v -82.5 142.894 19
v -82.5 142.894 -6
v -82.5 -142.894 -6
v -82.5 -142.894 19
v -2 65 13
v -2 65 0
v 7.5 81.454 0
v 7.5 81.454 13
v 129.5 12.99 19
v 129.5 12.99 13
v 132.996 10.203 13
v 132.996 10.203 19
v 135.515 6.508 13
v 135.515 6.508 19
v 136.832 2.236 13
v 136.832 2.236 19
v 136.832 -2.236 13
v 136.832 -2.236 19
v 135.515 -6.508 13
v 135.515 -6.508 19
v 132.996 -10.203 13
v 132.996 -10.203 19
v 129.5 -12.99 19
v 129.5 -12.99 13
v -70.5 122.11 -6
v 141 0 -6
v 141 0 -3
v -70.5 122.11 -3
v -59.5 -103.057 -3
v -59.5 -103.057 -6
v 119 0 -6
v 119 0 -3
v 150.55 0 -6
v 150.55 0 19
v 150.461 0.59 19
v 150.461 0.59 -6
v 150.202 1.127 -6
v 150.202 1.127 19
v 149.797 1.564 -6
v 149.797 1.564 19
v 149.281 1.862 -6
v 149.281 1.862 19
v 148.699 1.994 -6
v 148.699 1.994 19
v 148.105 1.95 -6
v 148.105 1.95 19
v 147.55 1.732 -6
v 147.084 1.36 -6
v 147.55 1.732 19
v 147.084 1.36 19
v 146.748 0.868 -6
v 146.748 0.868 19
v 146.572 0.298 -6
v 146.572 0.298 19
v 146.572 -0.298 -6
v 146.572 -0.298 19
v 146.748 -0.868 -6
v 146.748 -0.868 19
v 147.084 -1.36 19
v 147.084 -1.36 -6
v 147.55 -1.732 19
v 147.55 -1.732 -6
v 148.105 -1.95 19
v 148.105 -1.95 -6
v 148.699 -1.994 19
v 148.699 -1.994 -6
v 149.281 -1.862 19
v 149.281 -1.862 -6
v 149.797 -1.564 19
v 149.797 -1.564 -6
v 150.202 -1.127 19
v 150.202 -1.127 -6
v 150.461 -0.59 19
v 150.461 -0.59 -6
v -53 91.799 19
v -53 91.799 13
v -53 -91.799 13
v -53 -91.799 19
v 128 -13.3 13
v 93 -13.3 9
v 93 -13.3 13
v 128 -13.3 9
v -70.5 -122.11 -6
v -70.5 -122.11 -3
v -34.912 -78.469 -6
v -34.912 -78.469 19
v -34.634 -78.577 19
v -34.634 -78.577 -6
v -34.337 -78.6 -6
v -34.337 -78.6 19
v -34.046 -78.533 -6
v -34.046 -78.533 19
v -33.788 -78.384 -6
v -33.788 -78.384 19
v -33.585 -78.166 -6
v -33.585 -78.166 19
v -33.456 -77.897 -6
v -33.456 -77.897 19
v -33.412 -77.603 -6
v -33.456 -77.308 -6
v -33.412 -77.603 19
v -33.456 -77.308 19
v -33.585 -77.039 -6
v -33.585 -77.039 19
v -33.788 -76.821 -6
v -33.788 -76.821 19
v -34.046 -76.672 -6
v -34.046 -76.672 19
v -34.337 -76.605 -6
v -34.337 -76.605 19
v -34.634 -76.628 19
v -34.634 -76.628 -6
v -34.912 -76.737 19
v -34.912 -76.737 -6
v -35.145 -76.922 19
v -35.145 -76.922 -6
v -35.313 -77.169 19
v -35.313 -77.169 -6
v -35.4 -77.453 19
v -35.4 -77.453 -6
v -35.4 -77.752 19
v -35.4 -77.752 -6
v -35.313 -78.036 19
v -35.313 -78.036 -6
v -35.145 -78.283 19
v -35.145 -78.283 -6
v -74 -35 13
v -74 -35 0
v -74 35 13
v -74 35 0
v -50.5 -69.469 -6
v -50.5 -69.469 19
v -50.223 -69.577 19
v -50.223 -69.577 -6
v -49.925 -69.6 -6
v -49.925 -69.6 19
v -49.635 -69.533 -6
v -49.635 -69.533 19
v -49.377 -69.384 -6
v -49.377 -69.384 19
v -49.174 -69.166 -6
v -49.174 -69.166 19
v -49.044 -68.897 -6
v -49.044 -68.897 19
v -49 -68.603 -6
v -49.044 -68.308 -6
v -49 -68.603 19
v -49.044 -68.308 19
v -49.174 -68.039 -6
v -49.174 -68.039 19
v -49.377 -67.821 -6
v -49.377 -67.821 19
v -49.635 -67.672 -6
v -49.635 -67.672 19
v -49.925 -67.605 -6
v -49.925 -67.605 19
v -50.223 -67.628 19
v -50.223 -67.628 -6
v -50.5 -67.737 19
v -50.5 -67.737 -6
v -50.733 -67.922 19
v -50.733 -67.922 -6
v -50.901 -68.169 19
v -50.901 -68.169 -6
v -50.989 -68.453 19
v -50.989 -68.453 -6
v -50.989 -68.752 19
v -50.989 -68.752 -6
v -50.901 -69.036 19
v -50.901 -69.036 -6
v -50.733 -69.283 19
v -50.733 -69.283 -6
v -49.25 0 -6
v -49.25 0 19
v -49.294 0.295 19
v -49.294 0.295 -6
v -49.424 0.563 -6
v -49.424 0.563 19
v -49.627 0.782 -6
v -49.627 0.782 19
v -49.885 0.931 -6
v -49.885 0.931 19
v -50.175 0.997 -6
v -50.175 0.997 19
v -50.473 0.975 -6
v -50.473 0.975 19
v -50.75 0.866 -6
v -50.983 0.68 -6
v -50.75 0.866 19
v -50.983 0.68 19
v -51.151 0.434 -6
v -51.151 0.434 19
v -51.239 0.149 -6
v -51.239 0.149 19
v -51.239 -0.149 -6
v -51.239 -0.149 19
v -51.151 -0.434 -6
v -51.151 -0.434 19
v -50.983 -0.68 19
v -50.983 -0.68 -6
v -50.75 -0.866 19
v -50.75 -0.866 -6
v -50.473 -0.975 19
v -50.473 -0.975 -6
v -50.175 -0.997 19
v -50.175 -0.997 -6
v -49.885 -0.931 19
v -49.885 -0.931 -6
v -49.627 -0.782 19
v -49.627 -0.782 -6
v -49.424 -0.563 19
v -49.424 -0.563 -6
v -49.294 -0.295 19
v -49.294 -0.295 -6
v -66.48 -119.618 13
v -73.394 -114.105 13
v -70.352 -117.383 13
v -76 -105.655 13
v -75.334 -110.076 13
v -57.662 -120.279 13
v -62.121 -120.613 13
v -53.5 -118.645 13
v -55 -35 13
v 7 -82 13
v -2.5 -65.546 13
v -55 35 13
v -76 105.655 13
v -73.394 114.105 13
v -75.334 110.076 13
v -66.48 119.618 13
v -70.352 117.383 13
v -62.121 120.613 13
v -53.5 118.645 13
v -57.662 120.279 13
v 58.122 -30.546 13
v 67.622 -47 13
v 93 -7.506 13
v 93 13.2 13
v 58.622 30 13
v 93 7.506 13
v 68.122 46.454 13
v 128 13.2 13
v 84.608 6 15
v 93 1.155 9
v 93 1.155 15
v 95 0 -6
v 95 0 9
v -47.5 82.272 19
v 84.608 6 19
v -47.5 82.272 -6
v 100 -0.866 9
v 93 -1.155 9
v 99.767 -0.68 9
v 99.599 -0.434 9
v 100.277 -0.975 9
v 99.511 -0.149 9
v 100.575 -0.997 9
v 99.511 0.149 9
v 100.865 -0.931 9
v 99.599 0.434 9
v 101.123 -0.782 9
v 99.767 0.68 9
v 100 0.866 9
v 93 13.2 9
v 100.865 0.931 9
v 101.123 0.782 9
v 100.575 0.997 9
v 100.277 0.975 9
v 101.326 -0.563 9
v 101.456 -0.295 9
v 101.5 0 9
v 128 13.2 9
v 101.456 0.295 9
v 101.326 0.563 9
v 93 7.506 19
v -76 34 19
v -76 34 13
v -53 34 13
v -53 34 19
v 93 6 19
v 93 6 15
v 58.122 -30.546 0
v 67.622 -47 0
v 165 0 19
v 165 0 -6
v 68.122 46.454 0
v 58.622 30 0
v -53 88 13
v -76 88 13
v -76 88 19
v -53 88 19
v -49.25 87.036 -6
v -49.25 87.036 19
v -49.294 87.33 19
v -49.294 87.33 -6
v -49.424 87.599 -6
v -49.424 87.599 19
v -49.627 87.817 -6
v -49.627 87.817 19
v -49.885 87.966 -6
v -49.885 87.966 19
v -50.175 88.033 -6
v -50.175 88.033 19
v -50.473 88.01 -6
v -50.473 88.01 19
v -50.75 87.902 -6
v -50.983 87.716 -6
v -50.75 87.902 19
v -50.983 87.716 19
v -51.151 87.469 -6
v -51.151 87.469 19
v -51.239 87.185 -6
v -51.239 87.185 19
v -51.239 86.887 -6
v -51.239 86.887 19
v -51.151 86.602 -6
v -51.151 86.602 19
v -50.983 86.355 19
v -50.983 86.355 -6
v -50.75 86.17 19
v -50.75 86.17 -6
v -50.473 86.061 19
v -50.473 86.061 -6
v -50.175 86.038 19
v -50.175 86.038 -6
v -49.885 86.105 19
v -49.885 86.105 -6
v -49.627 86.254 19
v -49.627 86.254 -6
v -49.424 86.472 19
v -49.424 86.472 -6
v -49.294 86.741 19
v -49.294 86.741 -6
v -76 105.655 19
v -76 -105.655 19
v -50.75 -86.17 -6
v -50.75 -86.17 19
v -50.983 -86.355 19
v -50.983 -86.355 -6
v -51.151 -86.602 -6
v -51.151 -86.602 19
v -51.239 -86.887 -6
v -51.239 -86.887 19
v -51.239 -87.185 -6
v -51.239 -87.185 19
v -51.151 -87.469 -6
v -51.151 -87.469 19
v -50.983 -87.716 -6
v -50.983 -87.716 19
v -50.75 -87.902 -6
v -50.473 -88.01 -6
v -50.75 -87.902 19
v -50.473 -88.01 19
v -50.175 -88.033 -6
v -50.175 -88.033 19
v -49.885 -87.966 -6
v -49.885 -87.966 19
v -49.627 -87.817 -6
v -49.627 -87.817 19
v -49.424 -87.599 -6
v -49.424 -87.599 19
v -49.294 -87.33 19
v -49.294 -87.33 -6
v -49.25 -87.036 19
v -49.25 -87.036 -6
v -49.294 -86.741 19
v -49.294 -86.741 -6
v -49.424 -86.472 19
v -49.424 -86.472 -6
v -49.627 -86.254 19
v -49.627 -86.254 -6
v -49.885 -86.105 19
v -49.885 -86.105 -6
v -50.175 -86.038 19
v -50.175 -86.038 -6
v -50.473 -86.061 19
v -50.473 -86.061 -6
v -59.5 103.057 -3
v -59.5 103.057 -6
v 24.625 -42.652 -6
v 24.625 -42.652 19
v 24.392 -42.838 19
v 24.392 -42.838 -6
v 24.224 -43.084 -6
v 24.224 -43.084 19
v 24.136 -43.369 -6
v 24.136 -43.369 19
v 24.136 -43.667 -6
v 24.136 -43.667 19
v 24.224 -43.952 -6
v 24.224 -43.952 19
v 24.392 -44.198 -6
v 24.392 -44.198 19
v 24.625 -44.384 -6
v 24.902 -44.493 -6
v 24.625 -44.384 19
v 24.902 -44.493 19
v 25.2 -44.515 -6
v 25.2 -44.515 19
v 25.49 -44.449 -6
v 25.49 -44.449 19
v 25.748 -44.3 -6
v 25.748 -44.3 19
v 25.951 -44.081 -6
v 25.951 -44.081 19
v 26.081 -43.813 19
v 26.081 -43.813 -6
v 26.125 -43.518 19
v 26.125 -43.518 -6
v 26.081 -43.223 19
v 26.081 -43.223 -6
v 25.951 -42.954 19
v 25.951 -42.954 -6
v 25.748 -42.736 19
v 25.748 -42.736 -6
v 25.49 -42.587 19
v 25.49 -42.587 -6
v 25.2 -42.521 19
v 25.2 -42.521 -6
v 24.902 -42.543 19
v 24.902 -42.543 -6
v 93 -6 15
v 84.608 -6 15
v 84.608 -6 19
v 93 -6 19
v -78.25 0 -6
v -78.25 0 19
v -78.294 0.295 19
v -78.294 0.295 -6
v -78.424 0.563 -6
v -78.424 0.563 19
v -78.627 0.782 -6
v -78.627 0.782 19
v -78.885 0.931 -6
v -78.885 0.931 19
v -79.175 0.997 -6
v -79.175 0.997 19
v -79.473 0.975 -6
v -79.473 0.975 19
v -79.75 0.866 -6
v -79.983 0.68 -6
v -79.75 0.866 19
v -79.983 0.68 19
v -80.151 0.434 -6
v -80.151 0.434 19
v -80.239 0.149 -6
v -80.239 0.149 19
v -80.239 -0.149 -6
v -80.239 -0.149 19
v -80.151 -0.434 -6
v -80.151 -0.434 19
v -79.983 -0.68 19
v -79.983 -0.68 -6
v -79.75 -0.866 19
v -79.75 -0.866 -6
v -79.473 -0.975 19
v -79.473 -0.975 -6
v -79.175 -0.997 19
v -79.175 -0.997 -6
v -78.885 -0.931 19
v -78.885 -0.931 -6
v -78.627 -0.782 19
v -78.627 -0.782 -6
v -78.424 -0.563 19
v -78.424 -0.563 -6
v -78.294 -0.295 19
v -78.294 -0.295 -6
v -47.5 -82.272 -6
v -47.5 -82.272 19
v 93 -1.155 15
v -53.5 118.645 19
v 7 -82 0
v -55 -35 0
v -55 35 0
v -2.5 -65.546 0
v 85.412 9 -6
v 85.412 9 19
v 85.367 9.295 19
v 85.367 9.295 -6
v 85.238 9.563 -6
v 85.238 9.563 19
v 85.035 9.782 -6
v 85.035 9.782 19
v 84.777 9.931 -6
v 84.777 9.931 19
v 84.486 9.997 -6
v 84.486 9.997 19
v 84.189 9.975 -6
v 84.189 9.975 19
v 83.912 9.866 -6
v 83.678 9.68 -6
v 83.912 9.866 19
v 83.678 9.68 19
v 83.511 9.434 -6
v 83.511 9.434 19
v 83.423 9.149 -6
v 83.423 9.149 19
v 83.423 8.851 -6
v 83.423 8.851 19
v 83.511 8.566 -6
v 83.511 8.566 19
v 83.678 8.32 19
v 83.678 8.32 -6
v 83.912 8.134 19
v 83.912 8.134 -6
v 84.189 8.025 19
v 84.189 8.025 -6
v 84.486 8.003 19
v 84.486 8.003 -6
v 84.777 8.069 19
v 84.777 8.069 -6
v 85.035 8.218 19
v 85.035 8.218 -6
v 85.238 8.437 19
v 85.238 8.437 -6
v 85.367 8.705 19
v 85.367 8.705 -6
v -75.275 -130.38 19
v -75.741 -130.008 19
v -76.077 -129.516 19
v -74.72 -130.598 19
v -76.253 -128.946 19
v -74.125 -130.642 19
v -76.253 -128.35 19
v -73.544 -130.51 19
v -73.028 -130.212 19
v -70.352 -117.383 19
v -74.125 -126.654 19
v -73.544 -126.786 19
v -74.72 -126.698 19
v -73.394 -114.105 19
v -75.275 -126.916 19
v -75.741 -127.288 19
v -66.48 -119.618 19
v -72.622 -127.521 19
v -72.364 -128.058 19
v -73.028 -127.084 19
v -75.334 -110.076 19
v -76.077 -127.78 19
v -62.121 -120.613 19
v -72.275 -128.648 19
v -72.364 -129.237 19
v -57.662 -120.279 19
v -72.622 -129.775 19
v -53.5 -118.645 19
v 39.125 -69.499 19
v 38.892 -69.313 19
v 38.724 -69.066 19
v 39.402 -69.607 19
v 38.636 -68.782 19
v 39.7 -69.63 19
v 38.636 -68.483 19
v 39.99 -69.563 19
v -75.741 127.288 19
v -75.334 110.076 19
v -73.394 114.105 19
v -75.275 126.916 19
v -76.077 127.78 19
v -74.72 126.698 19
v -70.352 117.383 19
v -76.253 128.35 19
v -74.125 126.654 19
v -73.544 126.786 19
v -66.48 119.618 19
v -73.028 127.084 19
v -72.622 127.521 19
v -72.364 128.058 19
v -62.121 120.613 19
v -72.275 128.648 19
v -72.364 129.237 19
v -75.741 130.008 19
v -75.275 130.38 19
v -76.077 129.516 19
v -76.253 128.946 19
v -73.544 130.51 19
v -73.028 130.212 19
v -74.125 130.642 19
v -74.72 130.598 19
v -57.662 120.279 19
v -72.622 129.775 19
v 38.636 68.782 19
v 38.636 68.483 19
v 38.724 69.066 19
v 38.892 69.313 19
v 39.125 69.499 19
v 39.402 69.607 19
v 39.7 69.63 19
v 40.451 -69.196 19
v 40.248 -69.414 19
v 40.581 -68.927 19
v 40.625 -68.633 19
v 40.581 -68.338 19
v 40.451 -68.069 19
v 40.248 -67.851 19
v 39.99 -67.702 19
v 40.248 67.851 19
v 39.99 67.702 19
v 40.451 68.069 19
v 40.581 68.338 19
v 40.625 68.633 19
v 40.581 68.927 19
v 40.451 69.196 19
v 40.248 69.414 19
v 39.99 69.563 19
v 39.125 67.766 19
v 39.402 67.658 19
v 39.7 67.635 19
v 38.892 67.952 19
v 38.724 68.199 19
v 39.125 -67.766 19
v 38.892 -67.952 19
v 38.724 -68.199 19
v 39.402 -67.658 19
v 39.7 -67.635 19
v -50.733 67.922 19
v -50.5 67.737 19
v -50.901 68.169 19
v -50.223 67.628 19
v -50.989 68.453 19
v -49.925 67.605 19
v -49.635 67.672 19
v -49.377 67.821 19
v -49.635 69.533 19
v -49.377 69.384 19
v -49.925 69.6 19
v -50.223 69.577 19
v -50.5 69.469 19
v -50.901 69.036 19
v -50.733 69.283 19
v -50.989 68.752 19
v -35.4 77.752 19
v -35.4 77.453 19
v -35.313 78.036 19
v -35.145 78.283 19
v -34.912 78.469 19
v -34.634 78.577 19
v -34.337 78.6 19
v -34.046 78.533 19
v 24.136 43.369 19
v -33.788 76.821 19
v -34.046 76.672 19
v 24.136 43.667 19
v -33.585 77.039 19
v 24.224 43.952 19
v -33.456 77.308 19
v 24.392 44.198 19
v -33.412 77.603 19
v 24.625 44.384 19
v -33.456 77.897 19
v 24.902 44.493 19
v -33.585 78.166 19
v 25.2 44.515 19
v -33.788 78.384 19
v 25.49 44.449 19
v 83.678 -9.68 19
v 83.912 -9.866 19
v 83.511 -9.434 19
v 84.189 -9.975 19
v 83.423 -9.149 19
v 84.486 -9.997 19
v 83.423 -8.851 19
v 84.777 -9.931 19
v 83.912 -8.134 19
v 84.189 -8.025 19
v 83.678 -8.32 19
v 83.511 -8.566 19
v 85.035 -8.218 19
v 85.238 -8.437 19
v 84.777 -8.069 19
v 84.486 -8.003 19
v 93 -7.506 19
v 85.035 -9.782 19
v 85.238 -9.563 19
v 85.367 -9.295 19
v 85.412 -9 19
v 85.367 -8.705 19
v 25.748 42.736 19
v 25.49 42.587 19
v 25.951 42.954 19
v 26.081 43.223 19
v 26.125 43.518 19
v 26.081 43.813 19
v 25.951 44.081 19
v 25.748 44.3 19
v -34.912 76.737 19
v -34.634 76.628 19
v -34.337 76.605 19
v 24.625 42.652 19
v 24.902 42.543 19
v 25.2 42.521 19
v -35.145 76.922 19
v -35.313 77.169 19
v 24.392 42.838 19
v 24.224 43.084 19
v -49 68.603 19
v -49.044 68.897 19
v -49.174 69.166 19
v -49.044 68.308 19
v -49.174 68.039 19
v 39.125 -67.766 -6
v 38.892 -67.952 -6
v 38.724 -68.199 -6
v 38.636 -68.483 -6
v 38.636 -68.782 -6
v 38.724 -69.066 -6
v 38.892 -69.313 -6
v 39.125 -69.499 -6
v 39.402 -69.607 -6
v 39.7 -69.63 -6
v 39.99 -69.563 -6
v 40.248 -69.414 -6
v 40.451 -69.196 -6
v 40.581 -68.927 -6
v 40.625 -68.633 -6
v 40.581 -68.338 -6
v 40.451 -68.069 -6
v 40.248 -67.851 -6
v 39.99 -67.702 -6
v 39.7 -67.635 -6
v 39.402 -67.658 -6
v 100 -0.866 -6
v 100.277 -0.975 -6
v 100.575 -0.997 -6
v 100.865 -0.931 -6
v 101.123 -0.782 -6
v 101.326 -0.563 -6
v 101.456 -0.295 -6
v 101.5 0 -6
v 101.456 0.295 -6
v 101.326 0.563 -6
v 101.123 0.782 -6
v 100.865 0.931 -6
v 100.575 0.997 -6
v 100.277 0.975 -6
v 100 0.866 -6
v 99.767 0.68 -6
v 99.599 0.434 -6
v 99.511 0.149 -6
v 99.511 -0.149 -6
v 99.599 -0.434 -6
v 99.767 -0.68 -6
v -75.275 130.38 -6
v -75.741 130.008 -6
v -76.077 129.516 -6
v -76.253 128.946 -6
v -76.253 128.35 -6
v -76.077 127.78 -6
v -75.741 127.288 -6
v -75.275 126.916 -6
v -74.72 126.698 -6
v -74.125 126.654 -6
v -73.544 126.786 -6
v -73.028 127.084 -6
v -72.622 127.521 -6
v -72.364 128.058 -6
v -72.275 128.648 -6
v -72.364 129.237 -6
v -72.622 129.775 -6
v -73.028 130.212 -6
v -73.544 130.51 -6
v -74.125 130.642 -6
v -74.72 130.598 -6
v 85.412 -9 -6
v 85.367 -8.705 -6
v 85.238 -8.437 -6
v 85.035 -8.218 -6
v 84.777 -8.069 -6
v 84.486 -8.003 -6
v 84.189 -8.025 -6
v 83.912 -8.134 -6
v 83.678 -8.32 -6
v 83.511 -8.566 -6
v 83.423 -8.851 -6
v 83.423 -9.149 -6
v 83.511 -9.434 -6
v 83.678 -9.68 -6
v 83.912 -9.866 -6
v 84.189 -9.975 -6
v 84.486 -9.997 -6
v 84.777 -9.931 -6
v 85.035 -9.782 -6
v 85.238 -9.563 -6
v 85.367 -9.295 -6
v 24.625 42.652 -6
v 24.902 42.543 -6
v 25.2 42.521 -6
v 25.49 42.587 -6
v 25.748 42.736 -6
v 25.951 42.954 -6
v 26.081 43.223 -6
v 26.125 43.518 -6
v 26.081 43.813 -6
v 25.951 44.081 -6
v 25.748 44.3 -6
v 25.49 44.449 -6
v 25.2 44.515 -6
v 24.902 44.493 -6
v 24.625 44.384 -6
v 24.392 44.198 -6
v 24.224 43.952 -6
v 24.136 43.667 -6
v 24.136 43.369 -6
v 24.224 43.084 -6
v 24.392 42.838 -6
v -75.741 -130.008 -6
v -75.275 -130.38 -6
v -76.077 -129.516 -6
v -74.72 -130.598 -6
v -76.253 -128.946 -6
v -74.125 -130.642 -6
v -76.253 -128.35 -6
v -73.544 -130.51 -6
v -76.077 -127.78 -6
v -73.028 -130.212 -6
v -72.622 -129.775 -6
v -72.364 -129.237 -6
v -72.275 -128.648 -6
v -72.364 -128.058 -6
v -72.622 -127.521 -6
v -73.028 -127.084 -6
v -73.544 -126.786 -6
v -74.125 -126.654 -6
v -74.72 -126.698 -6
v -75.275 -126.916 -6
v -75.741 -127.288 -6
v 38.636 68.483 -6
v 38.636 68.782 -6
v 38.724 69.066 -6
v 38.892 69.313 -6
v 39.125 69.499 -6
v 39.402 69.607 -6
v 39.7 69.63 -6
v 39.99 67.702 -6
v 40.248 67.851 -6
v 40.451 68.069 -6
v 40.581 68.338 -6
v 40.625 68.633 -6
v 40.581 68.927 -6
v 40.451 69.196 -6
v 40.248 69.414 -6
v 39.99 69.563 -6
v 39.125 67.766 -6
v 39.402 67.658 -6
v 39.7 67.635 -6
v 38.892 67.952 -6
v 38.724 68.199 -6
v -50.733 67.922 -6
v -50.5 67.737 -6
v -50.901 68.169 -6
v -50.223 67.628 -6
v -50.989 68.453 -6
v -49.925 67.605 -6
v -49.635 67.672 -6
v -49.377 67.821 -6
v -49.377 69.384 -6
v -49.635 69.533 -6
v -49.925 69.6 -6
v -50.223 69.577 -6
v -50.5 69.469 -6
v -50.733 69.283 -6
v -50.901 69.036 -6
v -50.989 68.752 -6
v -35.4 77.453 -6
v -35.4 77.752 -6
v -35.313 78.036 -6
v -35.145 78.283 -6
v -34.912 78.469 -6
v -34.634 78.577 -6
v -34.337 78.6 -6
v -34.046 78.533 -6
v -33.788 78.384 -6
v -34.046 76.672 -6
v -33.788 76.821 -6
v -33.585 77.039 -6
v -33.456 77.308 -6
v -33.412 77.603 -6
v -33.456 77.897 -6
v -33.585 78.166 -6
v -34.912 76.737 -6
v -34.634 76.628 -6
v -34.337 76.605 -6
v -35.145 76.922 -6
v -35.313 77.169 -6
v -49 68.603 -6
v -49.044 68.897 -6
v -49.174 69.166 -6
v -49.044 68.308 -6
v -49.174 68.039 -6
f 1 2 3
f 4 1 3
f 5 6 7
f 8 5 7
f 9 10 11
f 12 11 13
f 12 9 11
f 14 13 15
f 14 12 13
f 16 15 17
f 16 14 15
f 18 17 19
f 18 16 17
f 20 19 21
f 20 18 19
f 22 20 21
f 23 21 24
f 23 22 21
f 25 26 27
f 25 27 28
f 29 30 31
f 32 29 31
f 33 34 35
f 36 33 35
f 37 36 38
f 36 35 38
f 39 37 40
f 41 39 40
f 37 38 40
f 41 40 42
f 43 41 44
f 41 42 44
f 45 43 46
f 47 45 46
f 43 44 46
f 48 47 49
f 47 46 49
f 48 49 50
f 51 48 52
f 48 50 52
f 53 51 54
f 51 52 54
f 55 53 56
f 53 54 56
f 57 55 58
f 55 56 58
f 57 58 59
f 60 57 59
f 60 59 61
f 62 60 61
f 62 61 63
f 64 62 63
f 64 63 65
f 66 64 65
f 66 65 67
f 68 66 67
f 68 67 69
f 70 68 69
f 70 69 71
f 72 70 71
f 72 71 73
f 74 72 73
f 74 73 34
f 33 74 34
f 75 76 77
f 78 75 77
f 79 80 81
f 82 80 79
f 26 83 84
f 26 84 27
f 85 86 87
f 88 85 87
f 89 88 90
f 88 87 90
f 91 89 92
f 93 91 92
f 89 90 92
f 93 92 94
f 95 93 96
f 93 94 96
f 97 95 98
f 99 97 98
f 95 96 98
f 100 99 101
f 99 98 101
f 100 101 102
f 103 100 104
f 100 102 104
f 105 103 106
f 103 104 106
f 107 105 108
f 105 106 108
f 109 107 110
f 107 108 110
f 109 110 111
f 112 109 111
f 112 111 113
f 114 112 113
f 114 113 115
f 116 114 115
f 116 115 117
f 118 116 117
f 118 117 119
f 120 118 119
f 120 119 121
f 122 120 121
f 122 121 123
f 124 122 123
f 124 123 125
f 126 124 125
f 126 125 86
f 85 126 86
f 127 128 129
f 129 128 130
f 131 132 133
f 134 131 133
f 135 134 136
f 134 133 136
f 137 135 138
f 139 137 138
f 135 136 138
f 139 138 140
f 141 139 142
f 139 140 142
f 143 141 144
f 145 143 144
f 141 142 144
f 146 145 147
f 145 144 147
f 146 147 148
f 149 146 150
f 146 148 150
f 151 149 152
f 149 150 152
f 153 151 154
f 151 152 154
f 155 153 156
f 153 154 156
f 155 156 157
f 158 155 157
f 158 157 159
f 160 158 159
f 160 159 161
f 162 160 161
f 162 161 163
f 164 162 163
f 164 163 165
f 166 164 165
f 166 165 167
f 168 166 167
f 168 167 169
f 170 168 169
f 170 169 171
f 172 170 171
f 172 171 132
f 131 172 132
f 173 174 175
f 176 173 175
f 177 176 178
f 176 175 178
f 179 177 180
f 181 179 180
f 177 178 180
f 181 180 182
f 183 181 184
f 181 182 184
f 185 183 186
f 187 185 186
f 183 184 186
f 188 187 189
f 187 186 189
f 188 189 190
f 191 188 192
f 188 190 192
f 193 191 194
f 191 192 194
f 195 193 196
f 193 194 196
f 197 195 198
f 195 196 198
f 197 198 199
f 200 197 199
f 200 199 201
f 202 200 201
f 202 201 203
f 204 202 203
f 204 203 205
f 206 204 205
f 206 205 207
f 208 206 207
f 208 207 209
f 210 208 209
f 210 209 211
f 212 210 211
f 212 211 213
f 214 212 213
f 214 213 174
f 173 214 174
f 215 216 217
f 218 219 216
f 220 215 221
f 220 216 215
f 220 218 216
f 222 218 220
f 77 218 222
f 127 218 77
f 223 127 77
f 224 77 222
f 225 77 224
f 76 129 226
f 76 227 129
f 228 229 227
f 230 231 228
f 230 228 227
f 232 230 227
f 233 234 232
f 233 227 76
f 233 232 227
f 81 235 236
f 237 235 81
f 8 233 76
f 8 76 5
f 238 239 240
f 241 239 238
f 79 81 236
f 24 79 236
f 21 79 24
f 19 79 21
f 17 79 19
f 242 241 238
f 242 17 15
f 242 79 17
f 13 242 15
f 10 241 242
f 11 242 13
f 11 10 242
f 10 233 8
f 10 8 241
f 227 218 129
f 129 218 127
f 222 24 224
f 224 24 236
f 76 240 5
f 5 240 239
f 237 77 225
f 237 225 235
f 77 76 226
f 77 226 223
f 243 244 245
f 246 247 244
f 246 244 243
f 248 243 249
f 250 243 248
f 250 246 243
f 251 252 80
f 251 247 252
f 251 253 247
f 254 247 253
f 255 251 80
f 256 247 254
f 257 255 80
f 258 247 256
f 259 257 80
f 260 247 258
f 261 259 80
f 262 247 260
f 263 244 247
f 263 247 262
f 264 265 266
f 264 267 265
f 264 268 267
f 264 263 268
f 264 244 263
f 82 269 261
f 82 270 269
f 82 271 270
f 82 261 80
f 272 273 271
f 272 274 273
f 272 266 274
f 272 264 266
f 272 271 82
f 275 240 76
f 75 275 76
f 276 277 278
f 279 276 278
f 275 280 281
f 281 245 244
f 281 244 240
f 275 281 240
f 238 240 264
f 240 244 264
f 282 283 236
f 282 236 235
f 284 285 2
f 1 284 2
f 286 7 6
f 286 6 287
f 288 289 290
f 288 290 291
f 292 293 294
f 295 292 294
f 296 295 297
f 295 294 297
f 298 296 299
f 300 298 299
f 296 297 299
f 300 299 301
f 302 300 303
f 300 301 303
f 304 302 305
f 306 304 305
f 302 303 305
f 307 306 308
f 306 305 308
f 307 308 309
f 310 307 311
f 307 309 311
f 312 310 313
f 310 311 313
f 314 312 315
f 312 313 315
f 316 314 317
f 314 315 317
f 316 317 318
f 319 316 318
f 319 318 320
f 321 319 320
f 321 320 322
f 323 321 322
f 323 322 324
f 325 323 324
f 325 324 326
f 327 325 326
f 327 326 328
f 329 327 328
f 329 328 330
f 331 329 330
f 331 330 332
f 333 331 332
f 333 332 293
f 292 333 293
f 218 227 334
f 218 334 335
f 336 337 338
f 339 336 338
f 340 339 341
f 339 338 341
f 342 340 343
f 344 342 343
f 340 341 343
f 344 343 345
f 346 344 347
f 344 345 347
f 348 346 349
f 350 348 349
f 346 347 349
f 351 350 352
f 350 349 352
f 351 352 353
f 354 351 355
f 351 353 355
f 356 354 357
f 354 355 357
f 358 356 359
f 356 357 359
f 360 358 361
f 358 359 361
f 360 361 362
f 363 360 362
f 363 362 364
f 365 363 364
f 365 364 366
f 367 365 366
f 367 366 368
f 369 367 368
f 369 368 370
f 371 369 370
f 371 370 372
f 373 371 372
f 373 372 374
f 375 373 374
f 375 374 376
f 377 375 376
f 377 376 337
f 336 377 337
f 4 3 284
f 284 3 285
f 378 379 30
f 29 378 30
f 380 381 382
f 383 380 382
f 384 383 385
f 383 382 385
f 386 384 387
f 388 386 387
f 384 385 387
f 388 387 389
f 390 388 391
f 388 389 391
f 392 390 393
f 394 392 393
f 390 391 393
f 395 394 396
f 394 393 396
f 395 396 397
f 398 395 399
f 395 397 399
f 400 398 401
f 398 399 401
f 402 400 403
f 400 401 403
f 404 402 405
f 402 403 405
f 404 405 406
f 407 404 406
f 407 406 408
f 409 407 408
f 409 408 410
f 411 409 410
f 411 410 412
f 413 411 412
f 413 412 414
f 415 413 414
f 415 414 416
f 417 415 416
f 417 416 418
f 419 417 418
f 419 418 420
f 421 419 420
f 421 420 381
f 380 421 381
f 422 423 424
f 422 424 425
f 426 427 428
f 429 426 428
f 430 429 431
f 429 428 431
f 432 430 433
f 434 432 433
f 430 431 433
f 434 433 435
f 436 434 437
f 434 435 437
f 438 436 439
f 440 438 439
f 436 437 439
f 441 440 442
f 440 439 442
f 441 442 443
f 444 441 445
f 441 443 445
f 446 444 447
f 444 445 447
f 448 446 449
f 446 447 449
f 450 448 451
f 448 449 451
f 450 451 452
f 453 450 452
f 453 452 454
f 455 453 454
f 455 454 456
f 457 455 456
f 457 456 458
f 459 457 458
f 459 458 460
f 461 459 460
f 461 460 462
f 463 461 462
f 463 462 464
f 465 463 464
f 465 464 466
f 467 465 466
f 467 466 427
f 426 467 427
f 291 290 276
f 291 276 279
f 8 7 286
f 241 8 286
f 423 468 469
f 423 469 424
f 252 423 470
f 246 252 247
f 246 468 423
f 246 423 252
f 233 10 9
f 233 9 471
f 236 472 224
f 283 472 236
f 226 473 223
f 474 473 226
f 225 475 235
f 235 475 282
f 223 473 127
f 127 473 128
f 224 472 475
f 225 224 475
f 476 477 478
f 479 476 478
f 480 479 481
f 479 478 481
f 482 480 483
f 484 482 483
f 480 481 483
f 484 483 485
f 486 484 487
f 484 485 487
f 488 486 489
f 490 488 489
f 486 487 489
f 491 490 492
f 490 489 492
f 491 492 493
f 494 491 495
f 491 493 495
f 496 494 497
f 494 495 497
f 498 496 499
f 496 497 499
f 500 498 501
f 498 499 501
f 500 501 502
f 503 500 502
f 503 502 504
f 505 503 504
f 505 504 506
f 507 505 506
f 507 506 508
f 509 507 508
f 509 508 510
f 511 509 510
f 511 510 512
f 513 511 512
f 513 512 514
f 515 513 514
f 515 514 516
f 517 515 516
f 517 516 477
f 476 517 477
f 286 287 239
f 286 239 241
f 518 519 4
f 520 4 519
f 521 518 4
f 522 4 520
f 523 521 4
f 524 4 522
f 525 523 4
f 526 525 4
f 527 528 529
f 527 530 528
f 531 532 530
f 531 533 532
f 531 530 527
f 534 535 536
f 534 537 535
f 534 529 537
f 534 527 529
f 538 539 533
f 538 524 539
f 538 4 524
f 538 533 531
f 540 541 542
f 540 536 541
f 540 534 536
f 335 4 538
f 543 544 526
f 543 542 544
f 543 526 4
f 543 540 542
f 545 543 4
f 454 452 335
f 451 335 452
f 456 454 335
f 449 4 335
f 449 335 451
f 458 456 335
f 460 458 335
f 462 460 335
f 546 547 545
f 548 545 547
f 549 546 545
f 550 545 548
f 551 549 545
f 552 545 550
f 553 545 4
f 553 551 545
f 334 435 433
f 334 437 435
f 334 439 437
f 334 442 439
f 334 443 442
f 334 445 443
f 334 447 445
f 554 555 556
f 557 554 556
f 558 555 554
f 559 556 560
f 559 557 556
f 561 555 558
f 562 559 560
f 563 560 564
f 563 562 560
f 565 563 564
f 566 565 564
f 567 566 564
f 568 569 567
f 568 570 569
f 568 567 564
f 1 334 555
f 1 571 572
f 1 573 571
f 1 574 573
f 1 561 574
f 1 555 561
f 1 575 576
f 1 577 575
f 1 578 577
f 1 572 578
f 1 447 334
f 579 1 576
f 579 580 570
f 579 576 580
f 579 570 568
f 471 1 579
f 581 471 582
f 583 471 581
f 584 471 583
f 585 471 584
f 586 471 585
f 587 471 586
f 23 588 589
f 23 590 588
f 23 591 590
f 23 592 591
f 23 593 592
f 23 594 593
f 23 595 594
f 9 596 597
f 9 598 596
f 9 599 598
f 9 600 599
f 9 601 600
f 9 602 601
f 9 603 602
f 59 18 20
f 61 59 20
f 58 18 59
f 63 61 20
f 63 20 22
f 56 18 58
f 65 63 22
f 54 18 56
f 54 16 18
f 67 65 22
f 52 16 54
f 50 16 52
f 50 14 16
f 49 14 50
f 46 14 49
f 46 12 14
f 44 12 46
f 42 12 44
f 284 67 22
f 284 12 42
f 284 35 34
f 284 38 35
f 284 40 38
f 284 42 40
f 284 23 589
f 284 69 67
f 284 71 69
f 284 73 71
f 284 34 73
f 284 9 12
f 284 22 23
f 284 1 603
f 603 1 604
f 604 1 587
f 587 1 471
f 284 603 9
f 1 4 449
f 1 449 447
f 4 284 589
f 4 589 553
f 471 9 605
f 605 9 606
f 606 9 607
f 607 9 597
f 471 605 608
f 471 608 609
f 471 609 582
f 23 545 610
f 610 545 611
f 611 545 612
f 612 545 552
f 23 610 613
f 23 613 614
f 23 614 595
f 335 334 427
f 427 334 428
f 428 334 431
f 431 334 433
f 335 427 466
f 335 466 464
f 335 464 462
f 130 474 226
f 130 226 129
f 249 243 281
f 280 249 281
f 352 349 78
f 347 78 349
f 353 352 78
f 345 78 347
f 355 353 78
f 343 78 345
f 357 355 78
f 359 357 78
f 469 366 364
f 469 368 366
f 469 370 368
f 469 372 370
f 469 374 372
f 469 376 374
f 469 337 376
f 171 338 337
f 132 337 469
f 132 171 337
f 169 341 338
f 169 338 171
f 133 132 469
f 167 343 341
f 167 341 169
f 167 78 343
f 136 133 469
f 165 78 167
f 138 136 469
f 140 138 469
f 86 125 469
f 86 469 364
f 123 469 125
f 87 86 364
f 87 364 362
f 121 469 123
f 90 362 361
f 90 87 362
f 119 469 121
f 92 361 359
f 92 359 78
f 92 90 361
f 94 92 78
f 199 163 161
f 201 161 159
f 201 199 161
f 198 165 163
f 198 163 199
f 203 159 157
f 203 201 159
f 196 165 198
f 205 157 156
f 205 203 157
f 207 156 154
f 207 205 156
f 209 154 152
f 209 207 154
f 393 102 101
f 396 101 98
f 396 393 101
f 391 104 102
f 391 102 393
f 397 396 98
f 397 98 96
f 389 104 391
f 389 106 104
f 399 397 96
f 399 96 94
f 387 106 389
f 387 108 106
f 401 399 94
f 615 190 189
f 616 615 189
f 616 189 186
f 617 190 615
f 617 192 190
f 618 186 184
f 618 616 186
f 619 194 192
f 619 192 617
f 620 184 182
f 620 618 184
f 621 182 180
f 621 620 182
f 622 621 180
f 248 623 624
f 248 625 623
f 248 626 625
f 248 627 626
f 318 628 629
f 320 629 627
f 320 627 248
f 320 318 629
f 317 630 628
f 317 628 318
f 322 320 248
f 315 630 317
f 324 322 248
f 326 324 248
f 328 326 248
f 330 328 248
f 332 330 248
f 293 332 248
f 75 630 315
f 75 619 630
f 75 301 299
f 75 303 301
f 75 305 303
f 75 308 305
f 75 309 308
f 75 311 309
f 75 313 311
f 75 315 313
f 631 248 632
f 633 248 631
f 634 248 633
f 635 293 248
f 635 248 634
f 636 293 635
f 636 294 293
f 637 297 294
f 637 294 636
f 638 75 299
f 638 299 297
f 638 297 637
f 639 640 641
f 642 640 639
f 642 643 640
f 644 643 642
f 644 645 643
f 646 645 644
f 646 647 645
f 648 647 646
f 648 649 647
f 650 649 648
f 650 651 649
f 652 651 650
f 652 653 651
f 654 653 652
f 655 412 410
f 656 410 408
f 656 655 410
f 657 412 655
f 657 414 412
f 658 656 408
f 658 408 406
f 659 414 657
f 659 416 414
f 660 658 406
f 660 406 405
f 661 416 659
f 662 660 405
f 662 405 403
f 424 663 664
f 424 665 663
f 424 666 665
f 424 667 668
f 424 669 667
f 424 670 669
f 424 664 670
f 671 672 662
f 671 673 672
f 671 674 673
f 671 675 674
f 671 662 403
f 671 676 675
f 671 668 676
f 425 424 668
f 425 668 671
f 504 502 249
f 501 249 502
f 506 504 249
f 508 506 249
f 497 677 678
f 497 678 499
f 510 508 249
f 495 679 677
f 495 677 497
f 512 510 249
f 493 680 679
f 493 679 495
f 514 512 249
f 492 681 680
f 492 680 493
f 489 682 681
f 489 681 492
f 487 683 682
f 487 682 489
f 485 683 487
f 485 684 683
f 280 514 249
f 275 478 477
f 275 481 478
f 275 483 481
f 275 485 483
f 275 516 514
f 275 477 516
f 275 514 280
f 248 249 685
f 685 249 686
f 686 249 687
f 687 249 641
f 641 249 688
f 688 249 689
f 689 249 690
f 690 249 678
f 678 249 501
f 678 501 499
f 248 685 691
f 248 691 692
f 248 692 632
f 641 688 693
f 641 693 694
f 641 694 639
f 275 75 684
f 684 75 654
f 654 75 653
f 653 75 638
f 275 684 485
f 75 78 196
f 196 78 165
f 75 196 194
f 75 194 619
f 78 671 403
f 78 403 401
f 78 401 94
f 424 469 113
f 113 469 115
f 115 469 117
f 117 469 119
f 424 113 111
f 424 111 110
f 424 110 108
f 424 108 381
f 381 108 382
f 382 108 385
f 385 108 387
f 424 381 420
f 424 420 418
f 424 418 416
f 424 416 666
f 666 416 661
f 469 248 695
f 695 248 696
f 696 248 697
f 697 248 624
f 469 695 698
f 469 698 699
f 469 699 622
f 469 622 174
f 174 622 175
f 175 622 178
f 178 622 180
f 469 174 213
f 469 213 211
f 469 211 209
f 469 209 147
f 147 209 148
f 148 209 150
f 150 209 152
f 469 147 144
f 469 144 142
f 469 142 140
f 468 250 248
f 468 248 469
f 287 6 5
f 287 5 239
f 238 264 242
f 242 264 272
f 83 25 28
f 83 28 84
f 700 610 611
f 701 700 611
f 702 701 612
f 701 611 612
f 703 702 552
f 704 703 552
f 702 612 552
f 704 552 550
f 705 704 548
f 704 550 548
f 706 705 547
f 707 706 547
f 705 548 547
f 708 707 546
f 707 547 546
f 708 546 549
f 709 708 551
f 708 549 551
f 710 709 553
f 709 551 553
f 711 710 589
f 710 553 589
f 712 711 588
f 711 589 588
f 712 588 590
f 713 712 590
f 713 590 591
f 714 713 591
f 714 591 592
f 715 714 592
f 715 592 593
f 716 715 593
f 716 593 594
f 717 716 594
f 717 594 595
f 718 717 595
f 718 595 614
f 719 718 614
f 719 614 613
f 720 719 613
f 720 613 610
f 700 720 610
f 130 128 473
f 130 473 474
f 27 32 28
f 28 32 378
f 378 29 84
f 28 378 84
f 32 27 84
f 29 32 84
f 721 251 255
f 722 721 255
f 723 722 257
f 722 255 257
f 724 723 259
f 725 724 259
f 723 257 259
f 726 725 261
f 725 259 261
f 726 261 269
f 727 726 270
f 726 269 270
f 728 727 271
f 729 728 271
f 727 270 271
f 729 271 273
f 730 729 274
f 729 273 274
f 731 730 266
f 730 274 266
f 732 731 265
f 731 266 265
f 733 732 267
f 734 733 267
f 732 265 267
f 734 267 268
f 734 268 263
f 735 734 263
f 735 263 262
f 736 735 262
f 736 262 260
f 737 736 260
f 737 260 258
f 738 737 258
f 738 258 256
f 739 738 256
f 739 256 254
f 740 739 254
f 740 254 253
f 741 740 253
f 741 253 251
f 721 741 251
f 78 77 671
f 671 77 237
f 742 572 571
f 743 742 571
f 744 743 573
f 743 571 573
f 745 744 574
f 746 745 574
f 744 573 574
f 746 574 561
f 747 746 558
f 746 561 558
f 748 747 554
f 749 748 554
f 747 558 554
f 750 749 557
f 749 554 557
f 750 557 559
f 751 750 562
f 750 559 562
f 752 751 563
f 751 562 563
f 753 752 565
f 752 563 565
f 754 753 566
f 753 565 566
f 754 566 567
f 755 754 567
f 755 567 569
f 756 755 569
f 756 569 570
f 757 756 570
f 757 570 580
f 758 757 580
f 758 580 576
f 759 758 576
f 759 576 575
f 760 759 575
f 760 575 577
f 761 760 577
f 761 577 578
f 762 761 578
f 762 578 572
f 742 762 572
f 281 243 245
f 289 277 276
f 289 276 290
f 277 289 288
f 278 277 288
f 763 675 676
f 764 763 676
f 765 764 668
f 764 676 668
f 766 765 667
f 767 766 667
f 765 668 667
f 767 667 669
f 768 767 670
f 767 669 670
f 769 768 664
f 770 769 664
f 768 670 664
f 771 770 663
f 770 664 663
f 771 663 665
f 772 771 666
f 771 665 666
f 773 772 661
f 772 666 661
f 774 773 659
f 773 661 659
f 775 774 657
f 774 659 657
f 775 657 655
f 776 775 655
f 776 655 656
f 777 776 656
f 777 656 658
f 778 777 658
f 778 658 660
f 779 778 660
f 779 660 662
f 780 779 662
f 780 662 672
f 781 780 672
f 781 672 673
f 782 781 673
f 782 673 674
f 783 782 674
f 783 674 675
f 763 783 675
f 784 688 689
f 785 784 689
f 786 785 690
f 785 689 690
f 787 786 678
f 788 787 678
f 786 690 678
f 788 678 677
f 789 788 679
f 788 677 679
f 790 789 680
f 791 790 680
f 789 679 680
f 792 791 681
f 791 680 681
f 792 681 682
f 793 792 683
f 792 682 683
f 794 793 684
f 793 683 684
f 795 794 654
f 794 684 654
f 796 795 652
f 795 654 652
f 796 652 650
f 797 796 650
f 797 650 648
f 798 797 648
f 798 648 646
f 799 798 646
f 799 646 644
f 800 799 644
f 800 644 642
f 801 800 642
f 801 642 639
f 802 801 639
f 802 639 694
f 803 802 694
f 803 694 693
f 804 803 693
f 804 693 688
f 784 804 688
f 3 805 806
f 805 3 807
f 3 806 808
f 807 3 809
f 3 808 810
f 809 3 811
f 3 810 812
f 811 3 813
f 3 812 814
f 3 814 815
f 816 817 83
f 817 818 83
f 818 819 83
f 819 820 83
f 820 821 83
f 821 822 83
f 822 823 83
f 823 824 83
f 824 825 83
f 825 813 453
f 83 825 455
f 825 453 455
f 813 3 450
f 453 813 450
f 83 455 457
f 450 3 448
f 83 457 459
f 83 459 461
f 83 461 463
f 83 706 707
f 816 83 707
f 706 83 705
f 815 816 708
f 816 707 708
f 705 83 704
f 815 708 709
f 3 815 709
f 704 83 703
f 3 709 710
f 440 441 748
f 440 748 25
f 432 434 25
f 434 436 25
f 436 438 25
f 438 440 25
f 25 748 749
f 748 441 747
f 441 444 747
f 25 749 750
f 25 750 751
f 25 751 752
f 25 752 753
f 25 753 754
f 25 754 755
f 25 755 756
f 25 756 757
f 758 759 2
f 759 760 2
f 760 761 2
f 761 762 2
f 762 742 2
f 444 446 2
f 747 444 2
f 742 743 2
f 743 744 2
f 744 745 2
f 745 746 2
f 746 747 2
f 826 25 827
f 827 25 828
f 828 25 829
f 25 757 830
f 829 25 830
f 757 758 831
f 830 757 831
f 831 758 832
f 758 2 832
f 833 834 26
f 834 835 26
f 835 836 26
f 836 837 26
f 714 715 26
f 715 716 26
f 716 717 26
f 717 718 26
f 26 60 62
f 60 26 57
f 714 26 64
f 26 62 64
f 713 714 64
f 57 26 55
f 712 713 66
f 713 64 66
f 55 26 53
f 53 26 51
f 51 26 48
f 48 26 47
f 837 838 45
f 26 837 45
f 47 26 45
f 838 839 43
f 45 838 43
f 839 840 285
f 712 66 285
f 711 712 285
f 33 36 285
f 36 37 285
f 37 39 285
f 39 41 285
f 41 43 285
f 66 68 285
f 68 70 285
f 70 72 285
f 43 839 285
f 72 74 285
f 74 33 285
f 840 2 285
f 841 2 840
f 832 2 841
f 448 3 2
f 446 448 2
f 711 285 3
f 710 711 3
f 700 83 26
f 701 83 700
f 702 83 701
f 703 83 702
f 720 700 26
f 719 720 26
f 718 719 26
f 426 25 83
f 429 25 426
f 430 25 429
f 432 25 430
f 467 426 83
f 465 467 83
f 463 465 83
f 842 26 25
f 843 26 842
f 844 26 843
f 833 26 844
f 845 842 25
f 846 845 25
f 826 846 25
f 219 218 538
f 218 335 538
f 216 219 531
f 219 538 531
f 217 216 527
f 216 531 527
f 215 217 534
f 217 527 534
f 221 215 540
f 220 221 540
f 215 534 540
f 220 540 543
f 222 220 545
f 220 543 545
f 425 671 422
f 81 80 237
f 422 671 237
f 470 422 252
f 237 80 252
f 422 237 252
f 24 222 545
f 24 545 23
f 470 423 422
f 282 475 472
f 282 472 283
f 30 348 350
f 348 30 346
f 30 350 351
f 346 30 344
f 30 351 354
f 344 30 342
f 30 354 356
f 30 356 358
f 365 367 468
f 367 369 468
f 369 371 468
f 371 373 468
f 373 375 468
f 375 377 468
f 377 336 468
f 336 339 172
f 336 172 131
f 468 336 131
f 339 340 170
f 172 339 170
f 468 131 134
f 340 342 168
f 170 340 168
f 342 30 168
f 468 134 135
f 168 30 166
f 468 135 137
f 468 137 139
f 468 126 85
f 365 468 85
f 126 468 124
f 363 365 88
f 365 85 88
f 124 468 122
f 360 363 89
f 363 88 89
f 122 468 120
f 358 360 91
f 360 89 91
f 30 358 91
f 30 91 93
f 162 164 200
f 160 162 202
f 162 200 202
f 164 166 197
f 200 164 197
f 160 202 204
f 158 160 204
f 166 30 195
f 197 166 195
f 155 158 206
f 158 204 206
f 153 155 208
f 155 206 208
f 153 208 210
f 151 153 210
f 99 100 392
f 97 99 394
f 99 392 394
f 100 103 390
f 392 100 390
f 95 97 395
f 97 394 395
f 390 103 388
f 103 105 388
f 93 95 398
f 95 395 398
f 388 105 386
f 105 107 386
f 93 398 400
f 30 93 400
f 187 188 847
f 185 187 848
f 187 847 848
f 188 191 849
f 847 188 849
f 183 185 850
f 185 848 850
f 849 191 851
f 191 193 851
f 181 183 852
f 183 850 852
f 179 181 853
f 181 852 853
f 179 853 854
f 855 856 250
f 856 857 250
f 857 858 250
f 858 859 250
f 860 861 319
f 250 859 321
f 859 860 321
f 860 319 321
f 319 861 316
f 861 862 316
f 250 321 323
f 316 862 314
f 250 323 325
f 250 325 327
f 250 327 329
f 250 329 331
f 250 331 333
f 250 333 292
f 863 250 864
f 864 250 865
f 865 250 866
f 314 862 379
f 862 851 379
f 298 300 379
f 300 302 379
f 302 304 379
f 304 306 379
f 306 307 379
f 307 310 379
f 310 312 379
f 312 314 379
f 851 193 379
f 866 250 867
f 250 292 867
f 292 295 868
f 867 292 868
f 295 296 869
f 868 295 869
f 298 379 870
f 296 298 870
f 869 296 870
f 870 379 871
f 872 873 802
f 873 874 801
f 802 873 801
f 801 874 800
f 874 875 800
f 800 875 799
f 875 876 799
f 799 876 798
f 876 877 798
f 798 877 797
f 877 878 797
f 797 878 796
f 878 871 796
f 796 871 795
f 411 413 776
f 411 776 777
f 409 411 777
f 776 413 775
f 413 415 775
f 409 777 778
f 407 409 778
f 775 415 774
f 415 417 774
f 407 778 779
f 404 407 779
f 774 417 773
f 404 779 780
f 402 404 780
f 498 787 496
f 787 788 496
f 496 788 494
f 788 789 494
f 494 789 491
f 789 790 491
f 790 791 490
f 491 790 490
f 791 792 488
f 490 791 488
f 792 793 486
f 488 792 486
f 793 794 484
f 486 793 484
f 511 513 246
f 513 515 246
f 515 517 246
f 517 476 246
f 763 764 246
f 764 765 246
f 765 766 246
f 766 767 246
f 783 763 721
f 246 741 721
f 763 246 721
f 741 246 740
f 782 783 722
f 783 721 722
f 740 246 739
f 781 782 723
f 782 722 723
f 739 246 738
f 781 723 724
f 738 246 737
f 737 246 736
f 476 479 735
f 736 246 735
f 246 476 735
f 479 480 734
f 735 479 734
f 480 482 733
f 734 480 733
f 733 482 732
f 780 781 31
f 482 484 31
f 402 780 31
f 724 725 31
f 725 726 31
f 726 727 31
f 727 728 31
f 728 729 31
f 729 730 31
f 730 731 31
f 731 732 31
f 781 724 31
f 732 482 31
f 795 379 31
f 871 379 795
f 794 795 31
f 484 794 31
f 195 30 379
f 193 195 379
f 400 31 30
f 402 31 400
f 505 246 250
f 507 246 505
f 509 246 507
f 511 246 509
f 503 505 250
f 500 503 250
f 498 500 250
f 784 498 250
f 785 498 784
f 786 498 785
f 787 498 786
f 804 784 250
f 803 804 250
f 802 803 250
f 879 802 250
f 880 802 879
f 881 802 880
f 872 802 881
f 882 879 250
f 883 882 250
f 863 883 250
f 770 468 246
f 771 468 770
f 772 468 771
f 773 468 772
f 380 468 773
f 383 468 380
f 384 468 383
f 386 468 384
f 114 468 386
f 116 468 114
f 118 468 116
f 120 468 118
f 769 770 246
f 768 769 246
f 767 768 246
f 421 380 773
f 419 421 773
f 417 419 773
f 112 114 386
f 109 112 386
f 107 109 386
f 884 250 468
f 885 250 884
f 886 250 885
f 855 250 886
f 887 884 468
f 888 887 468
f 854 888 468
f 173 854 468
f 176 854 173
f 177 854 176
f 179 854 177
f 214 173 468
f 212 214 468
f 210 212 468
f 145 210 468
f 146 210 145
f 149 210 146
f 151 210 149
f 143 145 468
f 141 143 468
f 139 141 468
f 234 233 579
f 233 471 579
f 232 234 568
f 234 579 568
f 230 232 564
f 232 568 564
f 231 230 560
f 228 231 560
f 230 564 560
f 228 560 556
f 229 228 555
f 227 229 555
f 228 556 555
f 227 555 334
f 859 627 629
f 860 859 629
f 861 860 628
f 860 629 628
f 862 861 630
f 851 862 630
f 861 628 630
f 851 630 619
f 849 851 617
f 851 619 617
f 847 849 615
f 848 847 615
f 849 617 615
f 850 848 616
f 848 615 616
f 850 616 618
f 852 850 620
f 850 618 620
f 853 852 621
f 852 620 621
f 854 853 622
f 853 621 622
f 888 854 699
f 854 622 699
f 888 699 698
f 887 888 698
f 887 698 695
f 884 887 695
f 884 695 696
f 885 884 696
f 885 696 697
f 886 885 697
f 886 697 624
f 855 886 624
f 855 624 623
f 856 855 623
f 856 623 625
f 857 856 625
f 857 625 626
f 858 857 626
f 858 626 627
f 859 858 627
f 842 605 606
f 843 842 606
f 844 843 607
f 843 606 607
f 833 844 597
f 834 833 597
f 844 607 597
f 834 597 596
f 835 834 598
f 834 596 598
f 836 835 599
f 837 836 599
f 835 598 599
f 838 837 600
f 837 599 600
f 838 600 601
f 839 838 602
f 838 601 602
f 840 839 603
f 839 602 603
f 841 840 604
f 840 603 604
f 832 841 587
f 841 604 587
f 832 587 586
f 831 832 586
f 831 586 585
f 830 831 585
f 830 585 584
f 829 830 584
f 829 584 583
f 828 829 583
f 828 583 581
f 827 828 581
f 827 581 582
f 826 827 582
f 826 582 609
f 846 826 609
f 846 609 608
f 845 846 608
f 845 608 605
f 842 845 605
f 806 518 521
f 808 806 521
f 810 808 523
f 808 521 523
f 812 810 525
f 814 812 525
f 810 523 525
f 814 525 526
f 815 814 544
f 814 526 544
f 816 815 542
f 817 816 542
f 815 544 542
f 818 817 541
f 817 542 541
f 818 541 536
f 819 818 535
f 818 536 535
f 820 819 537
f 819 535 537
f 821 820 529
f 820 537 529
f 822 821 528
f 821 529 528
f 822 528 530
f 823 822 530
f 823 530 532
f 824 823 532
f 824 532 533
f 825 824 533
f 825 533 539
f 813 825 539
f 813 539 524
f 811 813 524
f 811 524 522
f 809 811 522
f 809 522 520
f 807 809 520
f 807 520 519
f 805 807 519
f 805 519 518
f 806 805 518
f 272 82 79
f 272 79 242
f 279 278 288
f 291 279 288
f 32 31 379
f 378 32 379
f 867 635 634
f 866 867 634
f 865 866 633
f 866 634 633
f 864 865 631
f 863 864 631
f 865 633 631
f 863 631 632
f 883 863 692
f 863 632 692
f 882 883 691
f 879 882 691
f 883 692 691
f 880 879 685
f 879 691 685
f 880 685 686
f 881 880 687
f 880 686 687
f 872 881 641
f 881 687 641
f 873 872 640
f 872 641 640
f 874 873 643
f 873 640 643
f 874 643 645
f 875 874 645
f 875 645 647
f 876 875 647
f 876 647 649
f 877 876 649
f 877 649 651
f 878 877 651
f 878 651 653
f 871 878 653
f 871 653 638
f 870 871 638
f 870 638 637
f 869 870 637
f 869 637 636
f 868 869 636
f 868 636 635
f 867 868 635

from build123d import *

# Parameters (mm, degrees)
BOX005_W               = 23
BOX005_H               = 54
BOX005_DEPTH           = 6
PRISM003_DEPTH         = 6
PRISM002_DEPTH         = 6
BOX004_W               = 10
BOX004_H               = 12
BOX004_DEPTH           = 4
BOX003_W               = 35
BOX003_H               = 26.5
BOX003_DEPTH           = 10
BOX002_W               = 70
BOX002_H               = 19
BOX002_DEPTH           = 19
BOX002_PLACEMENT_ANGLE = 30
BOX001_W               = 70
BOX001_H               = 19
BOX001_DEPTH           = 19
BOX001_PLACEMENT_ANGLE = 90
BOX_W                  = 70
BOX_H                  = 19
BOX_DEPTH              = 19
BOX_PLACEMENT_ANGLE    = 30
PRISM001_DEPTH         = 25
PRISM_DEPTH            = 25
FILLET_R               = 15
SKETCH001_R            = 2
POCKET_DEPTH           = 782.777352
POLARPATTERN_COUNT     = 3
POCKET001_DEPTH        = 3
SKETCH002_R            = 1
POCKET002_DEPTH        = 782.777352
POLARPATTERN001_COUNT  = 3
SKETCH004_R            = 1
POCKET003_DEPTH        = 782.777352
POLARPATTERN002_COUNT  = 3
POLARPATTERN003_COUNT  = 3
SKETCH005_R            = 1
POCKET004_DEPTH        = 782.777352
POLARPATTERN004_COUNT  = 3


with BuildPart() as box005:
    # Box005 → Box005 (new body)
    with BuildSketch(Plane(origin=(-76, 34, 13), x_dir=(1, 0, 0), z_dir=(0, 0, 1))):
        with Locations((11.5, 27)):
            Rectangle(BOX005_W, BOX005_H)
    extrude(amount=BOX005_DEPTH)


with BuildPart() as prism003:
    # Prism003 → Prism003 (new body)
    with BuildSketch(Plane.XY.offset(13)):
        Polygon((106, 0), (-53, 91.798693), (-53, -91.798693), align=None)
    extrude(amount=PRISM003_DEPTH)


with BuildPart() as cut006:
    # Prism002 → Prism002 (new body)
    with BuildSketch(Plane.XY.offset(13)):
        Polygon((152, 0), (-76, 131.635861), (-76, -131.635861), align=None)
    extrude(amount=PRISM002_DEPTH)

    # Cut006: cut Prism003
    add(prism003.part, mode=Mode.SUBTRACT)


with BuildPart() as box004:
    # Box004 → Box004 (new body)
    with BuildSketch(Plane(origin=(84, -6, 15), x_dir=(1, 0, 0), z_dir=(0, 0, 1))):
        with Locations((5, 6)):
            Rectangle(BOX004_W, BOX004_H)
    extrude(amount=BOX004_DEPTH)


with BuildPart() as box003:
    # Box003 → Box003 (new body)
    with BuildSketch(Plane(origin=(93, -13.3, 9), x_dir=(1, 0, 0), z_dir=(0, 0, 1))):
        with Locations((17.5, 13.25)):
            Rectangle(BOX003_W, BOX003_H)
    extrude(amount=BOX003_DEPTH)


with BuildPart() as box002:
    # Box002 → Box002 (new body)
    with BuildSketch(Plane.XY):
        with Locations((35, 9.5)):
            Rectangle(BOX002_W, BOX002_H)
    extrude(amount=BOX002_DEPTH)


with BuildPart() as box002_1:
    # Box002 placement: moved
    add(box002.part.moved(Location((7, -82, 0))).rotate(Axis((7, -82, 0), (0, 0, 1)), BOX002_PLACEMENT_ANGLE))


with BuildPart() as box001:
    # Box001 → Box001 (new body)
    with BuildSketch(Plane.XY):
        with Locations((35, 9.5)):
            Rectangle(BOX001_W, BOX001_H)
    extrude(amount=BOX001_DEPTH)


with BuildPart() as box001_1:
    # Box001 placement: moved
    add(box001.part.moved(Location((-55, -35, 0))).rotate(Axis((-55, -35, 0), (0, 0, 1)), BOX001_PLACEMENT_ANGLE))


with BuildPart() as box:
    # Box → Box (new body)
    with BuildSketch(Plane.XY):
        with Locations((35, 9.5)):
            Rectangle(BOX_W, BOX_H)
    extrude(amount=BOX_DEPTH)


with BuildPart() as box_1:
    # Box placement: moved
    add(box.part.moved(Location((-2, 65, 0))).rotate(Axis((-2, 65, 0), (0, 0, -1)), BOX_PLACEMENT_ANGLE))


with BuildPart() as prism001:
    # Prism001 → Prism001 (new body)
    with BuildSketch(Plane.XY.offset(-6)):
        Polygon((95, 0), (-47.5, 82.272413), (-47.5, -82.272413), align=None)
    extrude(amount=PRISM001_DEPTH)


with BuildPart() as body:
    # Prism → Prism (new body)
    with BuildSketch(Plane.XY.offset(-6)):
        Polygon((165, 0), (-82.5, 142.894192), (-82.5, -142.894192), align=None)
    extrude(amount=PRISM_DEPTH)

    # Cut: cut Prism001
    add(prism001.part, mode=Mode.SUBTRACT)

    # Cut001: cut Box
    add(box_1.part, mode=Mode.SUBTRACT)

    # Cut002: cut Box001
    add(box001_1.part, mode=Mode.SUBTRACT)

    # Cut003: cut Box002
    add(box002_1.part, mode=Mode.SUBTRACT)

    # Cut004: cut Box003
    add(box003.part, mode=Mode.SUBTRACT)

    # Cut005: cut Box004
    add(box004.part, mode=Mode.SUBTRACT)

    # Cut007: cut Cut006
    add(cut006.part, mode=Mode.SUBTRACT)

    # Fillet
    fillet_edges = [body.edges().sort_by_distance(p)[0] for p in [
        (152, 0, 16),
        (-76, 131.635861, 16),
        (-76, -131.635861, 16),
    ]]
    fillet(fillet_edges, radius=FILLET_R)

    # Sketch001 (on Face1 of BaseFeature) → Pocket (cut, through all)
    with BuildSketch(Plane.XY.offset(19)):
        with Locations((148.549835, 0)):
            Circle(SKETCH001_R)
    pocket = extrude(amount=-POCKET_DEPTH, mode=Mode.SUBTRACT)

    # PolarPattern: Pocket ×3 about axis
    polarpattern_axis = Axis((0, 0, 19), (0, 0, 1))
    for i in range(1, POLARPATTERN_COUNT):
        add(pocket.rotate(polarpattern_axis, i * 360 / POLARPATTERN_COUNT), mode=Mode.SUBTRACT)

    # Sketch003 (on Face14 of PolarPattern) → Pocket001 (cut)
    with BuildSketch(Plane(origin=(0, 0, -6), x_dir=(1, 0, 0), z_dir=(0, 0, -1))):
        Polygon((-70.5, 122.109582), (141, 0), (-70.5, -122.109582), align=None)
        Polygon((-59.5, -103.057023), (-59.5, 103.057023), (119, 0), align=None, mode=Mode.SUBTRACT)
    extrude(amount=-POCKET001_DEPTH, mode=Mode.SUBTRACT)

    # Sketch002 (on Face39 of PolarPattern) → Pocket002 (cut, through all)
    with BuildSketch(Plane.XY.offset(19)):
        with Locations((-50.25, 0)):
            Circle(SKETCH002_R)
        with Locations((-50.25, 87.035553)):
            Circle(SKETCH002_R)
    pocket002 = extrude(amount=-POCKET002_DEPTH, mode=Mode.SUBTRACT)

    # PolarPattern001: Pocket002 ×3 about axis
    polarpattern001_axis = Axis((0, 0, 19), (0, 0, 1))
    for i in range(1, POLARPATTERN001_COUNT):
        add(pocket002.rotate(polarpattern001_axis, i * 360 / POLARPATTERN001_COUNT), mode=Mode.SUBTRACT)

    # Sketch004 (on Face40 of PolarPattern001) → Pocket003 (cut, through all)
    with BuildSketch(Plane.XY.offset(19)):
        with Locations((84.411543, 9)):
            Circle(SKETCH004_R)
        with Locations((84.411543, -9)):
            Circle(SKETCH004_R)
    pocket003 = extrude(amount=-POCKET003_DEPTH, mode=Mode.SUBTRACT)

    # PolarPattern002: Pocket003 ×3 about axis
    polarpattern002_axis = Axis((0, 0, 19), (0, 0, 1))
    for i in range(1, POLARPATTERN002_COUNT):
        add(pocket003.rotate(polarpattern002_axis, i * 360 / POLARPATTERN002_COUNT), mode=Mode.SUBTRACT)

    # PolarPattern003: Pocket002 ×3 about axis
    polarpattern003_axis = Axis((0, 0, 19), (0, 0, 1))
    for i in range(1, POLARPATTERN003_COUNT):
        add(pocket002.rotate(polarpattern003_axis, i * 360 / POLARPATTERN003_COUNT), mode=Mode.SUBTRACT)

    # Sketch005 (on Face1 of PolarPattern003) → Pocket004 (cut, through all)
    with BuildSketch(Plane.XY.offset(19)):
        with Locations((-79.25, 0)):
            Circle(SKETCH005_R)
    pocket004 = extrude(amount=-POCKET004_DEPTH, mode=Mode.SUBTRACT)

    # PolarPattern004: Pocket004 ×3 about axis
    polarpattern004_axis = Axis((0, 0, 19), (0, 0, 1))
    for i in range(1, POLARPATTERN004_COUNT):
        add(pocket004.rotate(polarpattern004_axis, i * 360 / POLARPATTERN004_COUNT), mode=Mode.SUBTRACT)


solid = Compound([box005.part, body.part])
